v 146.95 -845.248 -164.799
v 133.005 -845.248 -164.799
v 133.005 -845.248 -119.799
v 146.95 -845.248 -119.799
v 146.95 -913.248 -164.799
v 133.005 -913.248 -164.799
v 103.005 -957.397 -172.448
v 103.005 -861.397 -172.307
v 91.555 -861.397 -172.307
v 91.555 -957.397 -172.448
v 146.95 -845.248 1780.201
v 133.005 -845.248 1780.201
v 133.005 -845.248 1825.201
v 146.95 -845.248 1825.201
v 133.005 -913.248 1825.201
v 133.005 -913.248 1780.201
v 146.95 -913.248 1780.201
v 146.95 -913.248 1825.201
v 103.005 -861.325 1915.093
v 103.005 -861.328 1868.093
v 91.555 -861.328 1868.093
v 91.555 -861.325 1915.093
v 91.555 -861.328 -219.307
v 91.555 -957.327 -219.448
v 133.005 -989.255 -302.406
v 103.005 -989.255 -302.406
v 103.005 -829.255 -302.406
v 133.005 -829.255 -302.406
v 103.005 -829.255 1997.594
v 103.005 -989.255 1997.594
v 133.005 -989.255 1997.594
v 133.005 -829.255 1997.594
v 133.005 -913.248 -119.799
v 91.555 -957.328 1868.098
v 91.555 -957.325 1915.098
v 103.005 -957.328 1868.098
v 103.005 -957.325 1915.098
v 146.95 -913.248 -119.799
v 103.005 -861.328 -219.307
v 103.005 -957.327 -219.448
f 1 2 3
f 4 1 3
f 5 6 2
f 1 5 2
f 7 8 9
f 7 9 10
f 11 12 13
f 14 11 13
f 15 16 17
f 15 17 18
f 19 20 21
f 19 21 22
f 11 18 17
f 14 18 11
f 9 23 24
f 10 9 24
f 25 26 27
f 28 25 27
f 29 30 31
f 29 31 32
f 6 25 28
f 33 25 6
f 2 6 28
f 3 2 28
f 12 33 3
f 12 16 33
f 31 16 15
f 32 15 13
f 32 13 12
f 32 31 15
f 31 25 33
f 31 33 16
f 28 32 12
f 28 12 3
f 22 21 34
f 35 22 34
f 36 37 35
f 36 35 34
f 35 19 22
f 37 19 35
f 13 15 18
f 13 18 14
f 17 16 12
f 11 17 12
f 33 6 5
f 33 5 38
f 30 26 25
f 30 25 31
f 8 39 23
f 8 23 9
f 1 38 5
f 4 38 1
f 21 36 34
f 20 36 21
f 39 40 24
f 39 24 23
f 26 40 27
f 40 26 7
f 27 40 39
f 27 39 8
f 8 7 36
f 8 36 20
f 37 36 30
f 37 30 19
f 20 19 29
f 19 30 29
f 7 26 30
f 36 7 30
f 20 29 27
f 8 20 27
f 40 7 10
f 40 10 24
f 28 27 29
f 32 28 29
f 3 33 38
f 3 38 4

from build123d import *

# Parameters (mm, degrees)
SKETCH_W     = 160
SKETCH_H     = 2300
PAD_DEPTH    = 30
PAD001_DEPTH = 11.45
SKETCH004_W  = 68
SKETCH004_H  = 45
PAD004_DEPTH = 13.945


with BuildPart() as part:
    # Sketch → Pad (new body)
    with BuildSketch(Plane.YZ):
        with Locations((-911.017, 830.848)):
            Rectangle(SKETCH_W, SKETCH_H)
    extrude(amount=PAD_DEPTH)

    # Sketch001 (on Face5 of Pad) → Pad001 (join)
    with BuildSketch(Plane(origin=(0, 0, 0), x_dir=(0, 1, 0), z_dir=(-1, 0, 0))):
        Polygon((-959.089896, 236.194146), (-863.09, 236.053045), (-863.159081, 189.053045), (-959.158977, 189.194146), align=None)
        Polygon((-959.09, -1851.352361), (-863.09, -1851.346955), (-863.087354, -1898.346955), (-959.087354, -1898.352361), align=None)
    extrude(amount=PAD001_DEPTH)

    # Sketch004 (on Face5 of Pad001) → Pad004 (join)
    with BuildSketch(Plane.YZ.offset(30)):
        with Locations((-881.01, -159.045)):
            Rectangle(SKETCH004_W, SKETCH004_H)
        with Locations((-881.01, 1785.955)):
            Rectangle(SKETCH004_W, SKETCH004_H)
    extrude(amount=PAD004_DEPTH)


with BuildPart() as part_1:
    # Body placement: moved
    add(part.part.moved(Location((103.004971, 1.762416, 16.745678))))


solid = part_1.part
